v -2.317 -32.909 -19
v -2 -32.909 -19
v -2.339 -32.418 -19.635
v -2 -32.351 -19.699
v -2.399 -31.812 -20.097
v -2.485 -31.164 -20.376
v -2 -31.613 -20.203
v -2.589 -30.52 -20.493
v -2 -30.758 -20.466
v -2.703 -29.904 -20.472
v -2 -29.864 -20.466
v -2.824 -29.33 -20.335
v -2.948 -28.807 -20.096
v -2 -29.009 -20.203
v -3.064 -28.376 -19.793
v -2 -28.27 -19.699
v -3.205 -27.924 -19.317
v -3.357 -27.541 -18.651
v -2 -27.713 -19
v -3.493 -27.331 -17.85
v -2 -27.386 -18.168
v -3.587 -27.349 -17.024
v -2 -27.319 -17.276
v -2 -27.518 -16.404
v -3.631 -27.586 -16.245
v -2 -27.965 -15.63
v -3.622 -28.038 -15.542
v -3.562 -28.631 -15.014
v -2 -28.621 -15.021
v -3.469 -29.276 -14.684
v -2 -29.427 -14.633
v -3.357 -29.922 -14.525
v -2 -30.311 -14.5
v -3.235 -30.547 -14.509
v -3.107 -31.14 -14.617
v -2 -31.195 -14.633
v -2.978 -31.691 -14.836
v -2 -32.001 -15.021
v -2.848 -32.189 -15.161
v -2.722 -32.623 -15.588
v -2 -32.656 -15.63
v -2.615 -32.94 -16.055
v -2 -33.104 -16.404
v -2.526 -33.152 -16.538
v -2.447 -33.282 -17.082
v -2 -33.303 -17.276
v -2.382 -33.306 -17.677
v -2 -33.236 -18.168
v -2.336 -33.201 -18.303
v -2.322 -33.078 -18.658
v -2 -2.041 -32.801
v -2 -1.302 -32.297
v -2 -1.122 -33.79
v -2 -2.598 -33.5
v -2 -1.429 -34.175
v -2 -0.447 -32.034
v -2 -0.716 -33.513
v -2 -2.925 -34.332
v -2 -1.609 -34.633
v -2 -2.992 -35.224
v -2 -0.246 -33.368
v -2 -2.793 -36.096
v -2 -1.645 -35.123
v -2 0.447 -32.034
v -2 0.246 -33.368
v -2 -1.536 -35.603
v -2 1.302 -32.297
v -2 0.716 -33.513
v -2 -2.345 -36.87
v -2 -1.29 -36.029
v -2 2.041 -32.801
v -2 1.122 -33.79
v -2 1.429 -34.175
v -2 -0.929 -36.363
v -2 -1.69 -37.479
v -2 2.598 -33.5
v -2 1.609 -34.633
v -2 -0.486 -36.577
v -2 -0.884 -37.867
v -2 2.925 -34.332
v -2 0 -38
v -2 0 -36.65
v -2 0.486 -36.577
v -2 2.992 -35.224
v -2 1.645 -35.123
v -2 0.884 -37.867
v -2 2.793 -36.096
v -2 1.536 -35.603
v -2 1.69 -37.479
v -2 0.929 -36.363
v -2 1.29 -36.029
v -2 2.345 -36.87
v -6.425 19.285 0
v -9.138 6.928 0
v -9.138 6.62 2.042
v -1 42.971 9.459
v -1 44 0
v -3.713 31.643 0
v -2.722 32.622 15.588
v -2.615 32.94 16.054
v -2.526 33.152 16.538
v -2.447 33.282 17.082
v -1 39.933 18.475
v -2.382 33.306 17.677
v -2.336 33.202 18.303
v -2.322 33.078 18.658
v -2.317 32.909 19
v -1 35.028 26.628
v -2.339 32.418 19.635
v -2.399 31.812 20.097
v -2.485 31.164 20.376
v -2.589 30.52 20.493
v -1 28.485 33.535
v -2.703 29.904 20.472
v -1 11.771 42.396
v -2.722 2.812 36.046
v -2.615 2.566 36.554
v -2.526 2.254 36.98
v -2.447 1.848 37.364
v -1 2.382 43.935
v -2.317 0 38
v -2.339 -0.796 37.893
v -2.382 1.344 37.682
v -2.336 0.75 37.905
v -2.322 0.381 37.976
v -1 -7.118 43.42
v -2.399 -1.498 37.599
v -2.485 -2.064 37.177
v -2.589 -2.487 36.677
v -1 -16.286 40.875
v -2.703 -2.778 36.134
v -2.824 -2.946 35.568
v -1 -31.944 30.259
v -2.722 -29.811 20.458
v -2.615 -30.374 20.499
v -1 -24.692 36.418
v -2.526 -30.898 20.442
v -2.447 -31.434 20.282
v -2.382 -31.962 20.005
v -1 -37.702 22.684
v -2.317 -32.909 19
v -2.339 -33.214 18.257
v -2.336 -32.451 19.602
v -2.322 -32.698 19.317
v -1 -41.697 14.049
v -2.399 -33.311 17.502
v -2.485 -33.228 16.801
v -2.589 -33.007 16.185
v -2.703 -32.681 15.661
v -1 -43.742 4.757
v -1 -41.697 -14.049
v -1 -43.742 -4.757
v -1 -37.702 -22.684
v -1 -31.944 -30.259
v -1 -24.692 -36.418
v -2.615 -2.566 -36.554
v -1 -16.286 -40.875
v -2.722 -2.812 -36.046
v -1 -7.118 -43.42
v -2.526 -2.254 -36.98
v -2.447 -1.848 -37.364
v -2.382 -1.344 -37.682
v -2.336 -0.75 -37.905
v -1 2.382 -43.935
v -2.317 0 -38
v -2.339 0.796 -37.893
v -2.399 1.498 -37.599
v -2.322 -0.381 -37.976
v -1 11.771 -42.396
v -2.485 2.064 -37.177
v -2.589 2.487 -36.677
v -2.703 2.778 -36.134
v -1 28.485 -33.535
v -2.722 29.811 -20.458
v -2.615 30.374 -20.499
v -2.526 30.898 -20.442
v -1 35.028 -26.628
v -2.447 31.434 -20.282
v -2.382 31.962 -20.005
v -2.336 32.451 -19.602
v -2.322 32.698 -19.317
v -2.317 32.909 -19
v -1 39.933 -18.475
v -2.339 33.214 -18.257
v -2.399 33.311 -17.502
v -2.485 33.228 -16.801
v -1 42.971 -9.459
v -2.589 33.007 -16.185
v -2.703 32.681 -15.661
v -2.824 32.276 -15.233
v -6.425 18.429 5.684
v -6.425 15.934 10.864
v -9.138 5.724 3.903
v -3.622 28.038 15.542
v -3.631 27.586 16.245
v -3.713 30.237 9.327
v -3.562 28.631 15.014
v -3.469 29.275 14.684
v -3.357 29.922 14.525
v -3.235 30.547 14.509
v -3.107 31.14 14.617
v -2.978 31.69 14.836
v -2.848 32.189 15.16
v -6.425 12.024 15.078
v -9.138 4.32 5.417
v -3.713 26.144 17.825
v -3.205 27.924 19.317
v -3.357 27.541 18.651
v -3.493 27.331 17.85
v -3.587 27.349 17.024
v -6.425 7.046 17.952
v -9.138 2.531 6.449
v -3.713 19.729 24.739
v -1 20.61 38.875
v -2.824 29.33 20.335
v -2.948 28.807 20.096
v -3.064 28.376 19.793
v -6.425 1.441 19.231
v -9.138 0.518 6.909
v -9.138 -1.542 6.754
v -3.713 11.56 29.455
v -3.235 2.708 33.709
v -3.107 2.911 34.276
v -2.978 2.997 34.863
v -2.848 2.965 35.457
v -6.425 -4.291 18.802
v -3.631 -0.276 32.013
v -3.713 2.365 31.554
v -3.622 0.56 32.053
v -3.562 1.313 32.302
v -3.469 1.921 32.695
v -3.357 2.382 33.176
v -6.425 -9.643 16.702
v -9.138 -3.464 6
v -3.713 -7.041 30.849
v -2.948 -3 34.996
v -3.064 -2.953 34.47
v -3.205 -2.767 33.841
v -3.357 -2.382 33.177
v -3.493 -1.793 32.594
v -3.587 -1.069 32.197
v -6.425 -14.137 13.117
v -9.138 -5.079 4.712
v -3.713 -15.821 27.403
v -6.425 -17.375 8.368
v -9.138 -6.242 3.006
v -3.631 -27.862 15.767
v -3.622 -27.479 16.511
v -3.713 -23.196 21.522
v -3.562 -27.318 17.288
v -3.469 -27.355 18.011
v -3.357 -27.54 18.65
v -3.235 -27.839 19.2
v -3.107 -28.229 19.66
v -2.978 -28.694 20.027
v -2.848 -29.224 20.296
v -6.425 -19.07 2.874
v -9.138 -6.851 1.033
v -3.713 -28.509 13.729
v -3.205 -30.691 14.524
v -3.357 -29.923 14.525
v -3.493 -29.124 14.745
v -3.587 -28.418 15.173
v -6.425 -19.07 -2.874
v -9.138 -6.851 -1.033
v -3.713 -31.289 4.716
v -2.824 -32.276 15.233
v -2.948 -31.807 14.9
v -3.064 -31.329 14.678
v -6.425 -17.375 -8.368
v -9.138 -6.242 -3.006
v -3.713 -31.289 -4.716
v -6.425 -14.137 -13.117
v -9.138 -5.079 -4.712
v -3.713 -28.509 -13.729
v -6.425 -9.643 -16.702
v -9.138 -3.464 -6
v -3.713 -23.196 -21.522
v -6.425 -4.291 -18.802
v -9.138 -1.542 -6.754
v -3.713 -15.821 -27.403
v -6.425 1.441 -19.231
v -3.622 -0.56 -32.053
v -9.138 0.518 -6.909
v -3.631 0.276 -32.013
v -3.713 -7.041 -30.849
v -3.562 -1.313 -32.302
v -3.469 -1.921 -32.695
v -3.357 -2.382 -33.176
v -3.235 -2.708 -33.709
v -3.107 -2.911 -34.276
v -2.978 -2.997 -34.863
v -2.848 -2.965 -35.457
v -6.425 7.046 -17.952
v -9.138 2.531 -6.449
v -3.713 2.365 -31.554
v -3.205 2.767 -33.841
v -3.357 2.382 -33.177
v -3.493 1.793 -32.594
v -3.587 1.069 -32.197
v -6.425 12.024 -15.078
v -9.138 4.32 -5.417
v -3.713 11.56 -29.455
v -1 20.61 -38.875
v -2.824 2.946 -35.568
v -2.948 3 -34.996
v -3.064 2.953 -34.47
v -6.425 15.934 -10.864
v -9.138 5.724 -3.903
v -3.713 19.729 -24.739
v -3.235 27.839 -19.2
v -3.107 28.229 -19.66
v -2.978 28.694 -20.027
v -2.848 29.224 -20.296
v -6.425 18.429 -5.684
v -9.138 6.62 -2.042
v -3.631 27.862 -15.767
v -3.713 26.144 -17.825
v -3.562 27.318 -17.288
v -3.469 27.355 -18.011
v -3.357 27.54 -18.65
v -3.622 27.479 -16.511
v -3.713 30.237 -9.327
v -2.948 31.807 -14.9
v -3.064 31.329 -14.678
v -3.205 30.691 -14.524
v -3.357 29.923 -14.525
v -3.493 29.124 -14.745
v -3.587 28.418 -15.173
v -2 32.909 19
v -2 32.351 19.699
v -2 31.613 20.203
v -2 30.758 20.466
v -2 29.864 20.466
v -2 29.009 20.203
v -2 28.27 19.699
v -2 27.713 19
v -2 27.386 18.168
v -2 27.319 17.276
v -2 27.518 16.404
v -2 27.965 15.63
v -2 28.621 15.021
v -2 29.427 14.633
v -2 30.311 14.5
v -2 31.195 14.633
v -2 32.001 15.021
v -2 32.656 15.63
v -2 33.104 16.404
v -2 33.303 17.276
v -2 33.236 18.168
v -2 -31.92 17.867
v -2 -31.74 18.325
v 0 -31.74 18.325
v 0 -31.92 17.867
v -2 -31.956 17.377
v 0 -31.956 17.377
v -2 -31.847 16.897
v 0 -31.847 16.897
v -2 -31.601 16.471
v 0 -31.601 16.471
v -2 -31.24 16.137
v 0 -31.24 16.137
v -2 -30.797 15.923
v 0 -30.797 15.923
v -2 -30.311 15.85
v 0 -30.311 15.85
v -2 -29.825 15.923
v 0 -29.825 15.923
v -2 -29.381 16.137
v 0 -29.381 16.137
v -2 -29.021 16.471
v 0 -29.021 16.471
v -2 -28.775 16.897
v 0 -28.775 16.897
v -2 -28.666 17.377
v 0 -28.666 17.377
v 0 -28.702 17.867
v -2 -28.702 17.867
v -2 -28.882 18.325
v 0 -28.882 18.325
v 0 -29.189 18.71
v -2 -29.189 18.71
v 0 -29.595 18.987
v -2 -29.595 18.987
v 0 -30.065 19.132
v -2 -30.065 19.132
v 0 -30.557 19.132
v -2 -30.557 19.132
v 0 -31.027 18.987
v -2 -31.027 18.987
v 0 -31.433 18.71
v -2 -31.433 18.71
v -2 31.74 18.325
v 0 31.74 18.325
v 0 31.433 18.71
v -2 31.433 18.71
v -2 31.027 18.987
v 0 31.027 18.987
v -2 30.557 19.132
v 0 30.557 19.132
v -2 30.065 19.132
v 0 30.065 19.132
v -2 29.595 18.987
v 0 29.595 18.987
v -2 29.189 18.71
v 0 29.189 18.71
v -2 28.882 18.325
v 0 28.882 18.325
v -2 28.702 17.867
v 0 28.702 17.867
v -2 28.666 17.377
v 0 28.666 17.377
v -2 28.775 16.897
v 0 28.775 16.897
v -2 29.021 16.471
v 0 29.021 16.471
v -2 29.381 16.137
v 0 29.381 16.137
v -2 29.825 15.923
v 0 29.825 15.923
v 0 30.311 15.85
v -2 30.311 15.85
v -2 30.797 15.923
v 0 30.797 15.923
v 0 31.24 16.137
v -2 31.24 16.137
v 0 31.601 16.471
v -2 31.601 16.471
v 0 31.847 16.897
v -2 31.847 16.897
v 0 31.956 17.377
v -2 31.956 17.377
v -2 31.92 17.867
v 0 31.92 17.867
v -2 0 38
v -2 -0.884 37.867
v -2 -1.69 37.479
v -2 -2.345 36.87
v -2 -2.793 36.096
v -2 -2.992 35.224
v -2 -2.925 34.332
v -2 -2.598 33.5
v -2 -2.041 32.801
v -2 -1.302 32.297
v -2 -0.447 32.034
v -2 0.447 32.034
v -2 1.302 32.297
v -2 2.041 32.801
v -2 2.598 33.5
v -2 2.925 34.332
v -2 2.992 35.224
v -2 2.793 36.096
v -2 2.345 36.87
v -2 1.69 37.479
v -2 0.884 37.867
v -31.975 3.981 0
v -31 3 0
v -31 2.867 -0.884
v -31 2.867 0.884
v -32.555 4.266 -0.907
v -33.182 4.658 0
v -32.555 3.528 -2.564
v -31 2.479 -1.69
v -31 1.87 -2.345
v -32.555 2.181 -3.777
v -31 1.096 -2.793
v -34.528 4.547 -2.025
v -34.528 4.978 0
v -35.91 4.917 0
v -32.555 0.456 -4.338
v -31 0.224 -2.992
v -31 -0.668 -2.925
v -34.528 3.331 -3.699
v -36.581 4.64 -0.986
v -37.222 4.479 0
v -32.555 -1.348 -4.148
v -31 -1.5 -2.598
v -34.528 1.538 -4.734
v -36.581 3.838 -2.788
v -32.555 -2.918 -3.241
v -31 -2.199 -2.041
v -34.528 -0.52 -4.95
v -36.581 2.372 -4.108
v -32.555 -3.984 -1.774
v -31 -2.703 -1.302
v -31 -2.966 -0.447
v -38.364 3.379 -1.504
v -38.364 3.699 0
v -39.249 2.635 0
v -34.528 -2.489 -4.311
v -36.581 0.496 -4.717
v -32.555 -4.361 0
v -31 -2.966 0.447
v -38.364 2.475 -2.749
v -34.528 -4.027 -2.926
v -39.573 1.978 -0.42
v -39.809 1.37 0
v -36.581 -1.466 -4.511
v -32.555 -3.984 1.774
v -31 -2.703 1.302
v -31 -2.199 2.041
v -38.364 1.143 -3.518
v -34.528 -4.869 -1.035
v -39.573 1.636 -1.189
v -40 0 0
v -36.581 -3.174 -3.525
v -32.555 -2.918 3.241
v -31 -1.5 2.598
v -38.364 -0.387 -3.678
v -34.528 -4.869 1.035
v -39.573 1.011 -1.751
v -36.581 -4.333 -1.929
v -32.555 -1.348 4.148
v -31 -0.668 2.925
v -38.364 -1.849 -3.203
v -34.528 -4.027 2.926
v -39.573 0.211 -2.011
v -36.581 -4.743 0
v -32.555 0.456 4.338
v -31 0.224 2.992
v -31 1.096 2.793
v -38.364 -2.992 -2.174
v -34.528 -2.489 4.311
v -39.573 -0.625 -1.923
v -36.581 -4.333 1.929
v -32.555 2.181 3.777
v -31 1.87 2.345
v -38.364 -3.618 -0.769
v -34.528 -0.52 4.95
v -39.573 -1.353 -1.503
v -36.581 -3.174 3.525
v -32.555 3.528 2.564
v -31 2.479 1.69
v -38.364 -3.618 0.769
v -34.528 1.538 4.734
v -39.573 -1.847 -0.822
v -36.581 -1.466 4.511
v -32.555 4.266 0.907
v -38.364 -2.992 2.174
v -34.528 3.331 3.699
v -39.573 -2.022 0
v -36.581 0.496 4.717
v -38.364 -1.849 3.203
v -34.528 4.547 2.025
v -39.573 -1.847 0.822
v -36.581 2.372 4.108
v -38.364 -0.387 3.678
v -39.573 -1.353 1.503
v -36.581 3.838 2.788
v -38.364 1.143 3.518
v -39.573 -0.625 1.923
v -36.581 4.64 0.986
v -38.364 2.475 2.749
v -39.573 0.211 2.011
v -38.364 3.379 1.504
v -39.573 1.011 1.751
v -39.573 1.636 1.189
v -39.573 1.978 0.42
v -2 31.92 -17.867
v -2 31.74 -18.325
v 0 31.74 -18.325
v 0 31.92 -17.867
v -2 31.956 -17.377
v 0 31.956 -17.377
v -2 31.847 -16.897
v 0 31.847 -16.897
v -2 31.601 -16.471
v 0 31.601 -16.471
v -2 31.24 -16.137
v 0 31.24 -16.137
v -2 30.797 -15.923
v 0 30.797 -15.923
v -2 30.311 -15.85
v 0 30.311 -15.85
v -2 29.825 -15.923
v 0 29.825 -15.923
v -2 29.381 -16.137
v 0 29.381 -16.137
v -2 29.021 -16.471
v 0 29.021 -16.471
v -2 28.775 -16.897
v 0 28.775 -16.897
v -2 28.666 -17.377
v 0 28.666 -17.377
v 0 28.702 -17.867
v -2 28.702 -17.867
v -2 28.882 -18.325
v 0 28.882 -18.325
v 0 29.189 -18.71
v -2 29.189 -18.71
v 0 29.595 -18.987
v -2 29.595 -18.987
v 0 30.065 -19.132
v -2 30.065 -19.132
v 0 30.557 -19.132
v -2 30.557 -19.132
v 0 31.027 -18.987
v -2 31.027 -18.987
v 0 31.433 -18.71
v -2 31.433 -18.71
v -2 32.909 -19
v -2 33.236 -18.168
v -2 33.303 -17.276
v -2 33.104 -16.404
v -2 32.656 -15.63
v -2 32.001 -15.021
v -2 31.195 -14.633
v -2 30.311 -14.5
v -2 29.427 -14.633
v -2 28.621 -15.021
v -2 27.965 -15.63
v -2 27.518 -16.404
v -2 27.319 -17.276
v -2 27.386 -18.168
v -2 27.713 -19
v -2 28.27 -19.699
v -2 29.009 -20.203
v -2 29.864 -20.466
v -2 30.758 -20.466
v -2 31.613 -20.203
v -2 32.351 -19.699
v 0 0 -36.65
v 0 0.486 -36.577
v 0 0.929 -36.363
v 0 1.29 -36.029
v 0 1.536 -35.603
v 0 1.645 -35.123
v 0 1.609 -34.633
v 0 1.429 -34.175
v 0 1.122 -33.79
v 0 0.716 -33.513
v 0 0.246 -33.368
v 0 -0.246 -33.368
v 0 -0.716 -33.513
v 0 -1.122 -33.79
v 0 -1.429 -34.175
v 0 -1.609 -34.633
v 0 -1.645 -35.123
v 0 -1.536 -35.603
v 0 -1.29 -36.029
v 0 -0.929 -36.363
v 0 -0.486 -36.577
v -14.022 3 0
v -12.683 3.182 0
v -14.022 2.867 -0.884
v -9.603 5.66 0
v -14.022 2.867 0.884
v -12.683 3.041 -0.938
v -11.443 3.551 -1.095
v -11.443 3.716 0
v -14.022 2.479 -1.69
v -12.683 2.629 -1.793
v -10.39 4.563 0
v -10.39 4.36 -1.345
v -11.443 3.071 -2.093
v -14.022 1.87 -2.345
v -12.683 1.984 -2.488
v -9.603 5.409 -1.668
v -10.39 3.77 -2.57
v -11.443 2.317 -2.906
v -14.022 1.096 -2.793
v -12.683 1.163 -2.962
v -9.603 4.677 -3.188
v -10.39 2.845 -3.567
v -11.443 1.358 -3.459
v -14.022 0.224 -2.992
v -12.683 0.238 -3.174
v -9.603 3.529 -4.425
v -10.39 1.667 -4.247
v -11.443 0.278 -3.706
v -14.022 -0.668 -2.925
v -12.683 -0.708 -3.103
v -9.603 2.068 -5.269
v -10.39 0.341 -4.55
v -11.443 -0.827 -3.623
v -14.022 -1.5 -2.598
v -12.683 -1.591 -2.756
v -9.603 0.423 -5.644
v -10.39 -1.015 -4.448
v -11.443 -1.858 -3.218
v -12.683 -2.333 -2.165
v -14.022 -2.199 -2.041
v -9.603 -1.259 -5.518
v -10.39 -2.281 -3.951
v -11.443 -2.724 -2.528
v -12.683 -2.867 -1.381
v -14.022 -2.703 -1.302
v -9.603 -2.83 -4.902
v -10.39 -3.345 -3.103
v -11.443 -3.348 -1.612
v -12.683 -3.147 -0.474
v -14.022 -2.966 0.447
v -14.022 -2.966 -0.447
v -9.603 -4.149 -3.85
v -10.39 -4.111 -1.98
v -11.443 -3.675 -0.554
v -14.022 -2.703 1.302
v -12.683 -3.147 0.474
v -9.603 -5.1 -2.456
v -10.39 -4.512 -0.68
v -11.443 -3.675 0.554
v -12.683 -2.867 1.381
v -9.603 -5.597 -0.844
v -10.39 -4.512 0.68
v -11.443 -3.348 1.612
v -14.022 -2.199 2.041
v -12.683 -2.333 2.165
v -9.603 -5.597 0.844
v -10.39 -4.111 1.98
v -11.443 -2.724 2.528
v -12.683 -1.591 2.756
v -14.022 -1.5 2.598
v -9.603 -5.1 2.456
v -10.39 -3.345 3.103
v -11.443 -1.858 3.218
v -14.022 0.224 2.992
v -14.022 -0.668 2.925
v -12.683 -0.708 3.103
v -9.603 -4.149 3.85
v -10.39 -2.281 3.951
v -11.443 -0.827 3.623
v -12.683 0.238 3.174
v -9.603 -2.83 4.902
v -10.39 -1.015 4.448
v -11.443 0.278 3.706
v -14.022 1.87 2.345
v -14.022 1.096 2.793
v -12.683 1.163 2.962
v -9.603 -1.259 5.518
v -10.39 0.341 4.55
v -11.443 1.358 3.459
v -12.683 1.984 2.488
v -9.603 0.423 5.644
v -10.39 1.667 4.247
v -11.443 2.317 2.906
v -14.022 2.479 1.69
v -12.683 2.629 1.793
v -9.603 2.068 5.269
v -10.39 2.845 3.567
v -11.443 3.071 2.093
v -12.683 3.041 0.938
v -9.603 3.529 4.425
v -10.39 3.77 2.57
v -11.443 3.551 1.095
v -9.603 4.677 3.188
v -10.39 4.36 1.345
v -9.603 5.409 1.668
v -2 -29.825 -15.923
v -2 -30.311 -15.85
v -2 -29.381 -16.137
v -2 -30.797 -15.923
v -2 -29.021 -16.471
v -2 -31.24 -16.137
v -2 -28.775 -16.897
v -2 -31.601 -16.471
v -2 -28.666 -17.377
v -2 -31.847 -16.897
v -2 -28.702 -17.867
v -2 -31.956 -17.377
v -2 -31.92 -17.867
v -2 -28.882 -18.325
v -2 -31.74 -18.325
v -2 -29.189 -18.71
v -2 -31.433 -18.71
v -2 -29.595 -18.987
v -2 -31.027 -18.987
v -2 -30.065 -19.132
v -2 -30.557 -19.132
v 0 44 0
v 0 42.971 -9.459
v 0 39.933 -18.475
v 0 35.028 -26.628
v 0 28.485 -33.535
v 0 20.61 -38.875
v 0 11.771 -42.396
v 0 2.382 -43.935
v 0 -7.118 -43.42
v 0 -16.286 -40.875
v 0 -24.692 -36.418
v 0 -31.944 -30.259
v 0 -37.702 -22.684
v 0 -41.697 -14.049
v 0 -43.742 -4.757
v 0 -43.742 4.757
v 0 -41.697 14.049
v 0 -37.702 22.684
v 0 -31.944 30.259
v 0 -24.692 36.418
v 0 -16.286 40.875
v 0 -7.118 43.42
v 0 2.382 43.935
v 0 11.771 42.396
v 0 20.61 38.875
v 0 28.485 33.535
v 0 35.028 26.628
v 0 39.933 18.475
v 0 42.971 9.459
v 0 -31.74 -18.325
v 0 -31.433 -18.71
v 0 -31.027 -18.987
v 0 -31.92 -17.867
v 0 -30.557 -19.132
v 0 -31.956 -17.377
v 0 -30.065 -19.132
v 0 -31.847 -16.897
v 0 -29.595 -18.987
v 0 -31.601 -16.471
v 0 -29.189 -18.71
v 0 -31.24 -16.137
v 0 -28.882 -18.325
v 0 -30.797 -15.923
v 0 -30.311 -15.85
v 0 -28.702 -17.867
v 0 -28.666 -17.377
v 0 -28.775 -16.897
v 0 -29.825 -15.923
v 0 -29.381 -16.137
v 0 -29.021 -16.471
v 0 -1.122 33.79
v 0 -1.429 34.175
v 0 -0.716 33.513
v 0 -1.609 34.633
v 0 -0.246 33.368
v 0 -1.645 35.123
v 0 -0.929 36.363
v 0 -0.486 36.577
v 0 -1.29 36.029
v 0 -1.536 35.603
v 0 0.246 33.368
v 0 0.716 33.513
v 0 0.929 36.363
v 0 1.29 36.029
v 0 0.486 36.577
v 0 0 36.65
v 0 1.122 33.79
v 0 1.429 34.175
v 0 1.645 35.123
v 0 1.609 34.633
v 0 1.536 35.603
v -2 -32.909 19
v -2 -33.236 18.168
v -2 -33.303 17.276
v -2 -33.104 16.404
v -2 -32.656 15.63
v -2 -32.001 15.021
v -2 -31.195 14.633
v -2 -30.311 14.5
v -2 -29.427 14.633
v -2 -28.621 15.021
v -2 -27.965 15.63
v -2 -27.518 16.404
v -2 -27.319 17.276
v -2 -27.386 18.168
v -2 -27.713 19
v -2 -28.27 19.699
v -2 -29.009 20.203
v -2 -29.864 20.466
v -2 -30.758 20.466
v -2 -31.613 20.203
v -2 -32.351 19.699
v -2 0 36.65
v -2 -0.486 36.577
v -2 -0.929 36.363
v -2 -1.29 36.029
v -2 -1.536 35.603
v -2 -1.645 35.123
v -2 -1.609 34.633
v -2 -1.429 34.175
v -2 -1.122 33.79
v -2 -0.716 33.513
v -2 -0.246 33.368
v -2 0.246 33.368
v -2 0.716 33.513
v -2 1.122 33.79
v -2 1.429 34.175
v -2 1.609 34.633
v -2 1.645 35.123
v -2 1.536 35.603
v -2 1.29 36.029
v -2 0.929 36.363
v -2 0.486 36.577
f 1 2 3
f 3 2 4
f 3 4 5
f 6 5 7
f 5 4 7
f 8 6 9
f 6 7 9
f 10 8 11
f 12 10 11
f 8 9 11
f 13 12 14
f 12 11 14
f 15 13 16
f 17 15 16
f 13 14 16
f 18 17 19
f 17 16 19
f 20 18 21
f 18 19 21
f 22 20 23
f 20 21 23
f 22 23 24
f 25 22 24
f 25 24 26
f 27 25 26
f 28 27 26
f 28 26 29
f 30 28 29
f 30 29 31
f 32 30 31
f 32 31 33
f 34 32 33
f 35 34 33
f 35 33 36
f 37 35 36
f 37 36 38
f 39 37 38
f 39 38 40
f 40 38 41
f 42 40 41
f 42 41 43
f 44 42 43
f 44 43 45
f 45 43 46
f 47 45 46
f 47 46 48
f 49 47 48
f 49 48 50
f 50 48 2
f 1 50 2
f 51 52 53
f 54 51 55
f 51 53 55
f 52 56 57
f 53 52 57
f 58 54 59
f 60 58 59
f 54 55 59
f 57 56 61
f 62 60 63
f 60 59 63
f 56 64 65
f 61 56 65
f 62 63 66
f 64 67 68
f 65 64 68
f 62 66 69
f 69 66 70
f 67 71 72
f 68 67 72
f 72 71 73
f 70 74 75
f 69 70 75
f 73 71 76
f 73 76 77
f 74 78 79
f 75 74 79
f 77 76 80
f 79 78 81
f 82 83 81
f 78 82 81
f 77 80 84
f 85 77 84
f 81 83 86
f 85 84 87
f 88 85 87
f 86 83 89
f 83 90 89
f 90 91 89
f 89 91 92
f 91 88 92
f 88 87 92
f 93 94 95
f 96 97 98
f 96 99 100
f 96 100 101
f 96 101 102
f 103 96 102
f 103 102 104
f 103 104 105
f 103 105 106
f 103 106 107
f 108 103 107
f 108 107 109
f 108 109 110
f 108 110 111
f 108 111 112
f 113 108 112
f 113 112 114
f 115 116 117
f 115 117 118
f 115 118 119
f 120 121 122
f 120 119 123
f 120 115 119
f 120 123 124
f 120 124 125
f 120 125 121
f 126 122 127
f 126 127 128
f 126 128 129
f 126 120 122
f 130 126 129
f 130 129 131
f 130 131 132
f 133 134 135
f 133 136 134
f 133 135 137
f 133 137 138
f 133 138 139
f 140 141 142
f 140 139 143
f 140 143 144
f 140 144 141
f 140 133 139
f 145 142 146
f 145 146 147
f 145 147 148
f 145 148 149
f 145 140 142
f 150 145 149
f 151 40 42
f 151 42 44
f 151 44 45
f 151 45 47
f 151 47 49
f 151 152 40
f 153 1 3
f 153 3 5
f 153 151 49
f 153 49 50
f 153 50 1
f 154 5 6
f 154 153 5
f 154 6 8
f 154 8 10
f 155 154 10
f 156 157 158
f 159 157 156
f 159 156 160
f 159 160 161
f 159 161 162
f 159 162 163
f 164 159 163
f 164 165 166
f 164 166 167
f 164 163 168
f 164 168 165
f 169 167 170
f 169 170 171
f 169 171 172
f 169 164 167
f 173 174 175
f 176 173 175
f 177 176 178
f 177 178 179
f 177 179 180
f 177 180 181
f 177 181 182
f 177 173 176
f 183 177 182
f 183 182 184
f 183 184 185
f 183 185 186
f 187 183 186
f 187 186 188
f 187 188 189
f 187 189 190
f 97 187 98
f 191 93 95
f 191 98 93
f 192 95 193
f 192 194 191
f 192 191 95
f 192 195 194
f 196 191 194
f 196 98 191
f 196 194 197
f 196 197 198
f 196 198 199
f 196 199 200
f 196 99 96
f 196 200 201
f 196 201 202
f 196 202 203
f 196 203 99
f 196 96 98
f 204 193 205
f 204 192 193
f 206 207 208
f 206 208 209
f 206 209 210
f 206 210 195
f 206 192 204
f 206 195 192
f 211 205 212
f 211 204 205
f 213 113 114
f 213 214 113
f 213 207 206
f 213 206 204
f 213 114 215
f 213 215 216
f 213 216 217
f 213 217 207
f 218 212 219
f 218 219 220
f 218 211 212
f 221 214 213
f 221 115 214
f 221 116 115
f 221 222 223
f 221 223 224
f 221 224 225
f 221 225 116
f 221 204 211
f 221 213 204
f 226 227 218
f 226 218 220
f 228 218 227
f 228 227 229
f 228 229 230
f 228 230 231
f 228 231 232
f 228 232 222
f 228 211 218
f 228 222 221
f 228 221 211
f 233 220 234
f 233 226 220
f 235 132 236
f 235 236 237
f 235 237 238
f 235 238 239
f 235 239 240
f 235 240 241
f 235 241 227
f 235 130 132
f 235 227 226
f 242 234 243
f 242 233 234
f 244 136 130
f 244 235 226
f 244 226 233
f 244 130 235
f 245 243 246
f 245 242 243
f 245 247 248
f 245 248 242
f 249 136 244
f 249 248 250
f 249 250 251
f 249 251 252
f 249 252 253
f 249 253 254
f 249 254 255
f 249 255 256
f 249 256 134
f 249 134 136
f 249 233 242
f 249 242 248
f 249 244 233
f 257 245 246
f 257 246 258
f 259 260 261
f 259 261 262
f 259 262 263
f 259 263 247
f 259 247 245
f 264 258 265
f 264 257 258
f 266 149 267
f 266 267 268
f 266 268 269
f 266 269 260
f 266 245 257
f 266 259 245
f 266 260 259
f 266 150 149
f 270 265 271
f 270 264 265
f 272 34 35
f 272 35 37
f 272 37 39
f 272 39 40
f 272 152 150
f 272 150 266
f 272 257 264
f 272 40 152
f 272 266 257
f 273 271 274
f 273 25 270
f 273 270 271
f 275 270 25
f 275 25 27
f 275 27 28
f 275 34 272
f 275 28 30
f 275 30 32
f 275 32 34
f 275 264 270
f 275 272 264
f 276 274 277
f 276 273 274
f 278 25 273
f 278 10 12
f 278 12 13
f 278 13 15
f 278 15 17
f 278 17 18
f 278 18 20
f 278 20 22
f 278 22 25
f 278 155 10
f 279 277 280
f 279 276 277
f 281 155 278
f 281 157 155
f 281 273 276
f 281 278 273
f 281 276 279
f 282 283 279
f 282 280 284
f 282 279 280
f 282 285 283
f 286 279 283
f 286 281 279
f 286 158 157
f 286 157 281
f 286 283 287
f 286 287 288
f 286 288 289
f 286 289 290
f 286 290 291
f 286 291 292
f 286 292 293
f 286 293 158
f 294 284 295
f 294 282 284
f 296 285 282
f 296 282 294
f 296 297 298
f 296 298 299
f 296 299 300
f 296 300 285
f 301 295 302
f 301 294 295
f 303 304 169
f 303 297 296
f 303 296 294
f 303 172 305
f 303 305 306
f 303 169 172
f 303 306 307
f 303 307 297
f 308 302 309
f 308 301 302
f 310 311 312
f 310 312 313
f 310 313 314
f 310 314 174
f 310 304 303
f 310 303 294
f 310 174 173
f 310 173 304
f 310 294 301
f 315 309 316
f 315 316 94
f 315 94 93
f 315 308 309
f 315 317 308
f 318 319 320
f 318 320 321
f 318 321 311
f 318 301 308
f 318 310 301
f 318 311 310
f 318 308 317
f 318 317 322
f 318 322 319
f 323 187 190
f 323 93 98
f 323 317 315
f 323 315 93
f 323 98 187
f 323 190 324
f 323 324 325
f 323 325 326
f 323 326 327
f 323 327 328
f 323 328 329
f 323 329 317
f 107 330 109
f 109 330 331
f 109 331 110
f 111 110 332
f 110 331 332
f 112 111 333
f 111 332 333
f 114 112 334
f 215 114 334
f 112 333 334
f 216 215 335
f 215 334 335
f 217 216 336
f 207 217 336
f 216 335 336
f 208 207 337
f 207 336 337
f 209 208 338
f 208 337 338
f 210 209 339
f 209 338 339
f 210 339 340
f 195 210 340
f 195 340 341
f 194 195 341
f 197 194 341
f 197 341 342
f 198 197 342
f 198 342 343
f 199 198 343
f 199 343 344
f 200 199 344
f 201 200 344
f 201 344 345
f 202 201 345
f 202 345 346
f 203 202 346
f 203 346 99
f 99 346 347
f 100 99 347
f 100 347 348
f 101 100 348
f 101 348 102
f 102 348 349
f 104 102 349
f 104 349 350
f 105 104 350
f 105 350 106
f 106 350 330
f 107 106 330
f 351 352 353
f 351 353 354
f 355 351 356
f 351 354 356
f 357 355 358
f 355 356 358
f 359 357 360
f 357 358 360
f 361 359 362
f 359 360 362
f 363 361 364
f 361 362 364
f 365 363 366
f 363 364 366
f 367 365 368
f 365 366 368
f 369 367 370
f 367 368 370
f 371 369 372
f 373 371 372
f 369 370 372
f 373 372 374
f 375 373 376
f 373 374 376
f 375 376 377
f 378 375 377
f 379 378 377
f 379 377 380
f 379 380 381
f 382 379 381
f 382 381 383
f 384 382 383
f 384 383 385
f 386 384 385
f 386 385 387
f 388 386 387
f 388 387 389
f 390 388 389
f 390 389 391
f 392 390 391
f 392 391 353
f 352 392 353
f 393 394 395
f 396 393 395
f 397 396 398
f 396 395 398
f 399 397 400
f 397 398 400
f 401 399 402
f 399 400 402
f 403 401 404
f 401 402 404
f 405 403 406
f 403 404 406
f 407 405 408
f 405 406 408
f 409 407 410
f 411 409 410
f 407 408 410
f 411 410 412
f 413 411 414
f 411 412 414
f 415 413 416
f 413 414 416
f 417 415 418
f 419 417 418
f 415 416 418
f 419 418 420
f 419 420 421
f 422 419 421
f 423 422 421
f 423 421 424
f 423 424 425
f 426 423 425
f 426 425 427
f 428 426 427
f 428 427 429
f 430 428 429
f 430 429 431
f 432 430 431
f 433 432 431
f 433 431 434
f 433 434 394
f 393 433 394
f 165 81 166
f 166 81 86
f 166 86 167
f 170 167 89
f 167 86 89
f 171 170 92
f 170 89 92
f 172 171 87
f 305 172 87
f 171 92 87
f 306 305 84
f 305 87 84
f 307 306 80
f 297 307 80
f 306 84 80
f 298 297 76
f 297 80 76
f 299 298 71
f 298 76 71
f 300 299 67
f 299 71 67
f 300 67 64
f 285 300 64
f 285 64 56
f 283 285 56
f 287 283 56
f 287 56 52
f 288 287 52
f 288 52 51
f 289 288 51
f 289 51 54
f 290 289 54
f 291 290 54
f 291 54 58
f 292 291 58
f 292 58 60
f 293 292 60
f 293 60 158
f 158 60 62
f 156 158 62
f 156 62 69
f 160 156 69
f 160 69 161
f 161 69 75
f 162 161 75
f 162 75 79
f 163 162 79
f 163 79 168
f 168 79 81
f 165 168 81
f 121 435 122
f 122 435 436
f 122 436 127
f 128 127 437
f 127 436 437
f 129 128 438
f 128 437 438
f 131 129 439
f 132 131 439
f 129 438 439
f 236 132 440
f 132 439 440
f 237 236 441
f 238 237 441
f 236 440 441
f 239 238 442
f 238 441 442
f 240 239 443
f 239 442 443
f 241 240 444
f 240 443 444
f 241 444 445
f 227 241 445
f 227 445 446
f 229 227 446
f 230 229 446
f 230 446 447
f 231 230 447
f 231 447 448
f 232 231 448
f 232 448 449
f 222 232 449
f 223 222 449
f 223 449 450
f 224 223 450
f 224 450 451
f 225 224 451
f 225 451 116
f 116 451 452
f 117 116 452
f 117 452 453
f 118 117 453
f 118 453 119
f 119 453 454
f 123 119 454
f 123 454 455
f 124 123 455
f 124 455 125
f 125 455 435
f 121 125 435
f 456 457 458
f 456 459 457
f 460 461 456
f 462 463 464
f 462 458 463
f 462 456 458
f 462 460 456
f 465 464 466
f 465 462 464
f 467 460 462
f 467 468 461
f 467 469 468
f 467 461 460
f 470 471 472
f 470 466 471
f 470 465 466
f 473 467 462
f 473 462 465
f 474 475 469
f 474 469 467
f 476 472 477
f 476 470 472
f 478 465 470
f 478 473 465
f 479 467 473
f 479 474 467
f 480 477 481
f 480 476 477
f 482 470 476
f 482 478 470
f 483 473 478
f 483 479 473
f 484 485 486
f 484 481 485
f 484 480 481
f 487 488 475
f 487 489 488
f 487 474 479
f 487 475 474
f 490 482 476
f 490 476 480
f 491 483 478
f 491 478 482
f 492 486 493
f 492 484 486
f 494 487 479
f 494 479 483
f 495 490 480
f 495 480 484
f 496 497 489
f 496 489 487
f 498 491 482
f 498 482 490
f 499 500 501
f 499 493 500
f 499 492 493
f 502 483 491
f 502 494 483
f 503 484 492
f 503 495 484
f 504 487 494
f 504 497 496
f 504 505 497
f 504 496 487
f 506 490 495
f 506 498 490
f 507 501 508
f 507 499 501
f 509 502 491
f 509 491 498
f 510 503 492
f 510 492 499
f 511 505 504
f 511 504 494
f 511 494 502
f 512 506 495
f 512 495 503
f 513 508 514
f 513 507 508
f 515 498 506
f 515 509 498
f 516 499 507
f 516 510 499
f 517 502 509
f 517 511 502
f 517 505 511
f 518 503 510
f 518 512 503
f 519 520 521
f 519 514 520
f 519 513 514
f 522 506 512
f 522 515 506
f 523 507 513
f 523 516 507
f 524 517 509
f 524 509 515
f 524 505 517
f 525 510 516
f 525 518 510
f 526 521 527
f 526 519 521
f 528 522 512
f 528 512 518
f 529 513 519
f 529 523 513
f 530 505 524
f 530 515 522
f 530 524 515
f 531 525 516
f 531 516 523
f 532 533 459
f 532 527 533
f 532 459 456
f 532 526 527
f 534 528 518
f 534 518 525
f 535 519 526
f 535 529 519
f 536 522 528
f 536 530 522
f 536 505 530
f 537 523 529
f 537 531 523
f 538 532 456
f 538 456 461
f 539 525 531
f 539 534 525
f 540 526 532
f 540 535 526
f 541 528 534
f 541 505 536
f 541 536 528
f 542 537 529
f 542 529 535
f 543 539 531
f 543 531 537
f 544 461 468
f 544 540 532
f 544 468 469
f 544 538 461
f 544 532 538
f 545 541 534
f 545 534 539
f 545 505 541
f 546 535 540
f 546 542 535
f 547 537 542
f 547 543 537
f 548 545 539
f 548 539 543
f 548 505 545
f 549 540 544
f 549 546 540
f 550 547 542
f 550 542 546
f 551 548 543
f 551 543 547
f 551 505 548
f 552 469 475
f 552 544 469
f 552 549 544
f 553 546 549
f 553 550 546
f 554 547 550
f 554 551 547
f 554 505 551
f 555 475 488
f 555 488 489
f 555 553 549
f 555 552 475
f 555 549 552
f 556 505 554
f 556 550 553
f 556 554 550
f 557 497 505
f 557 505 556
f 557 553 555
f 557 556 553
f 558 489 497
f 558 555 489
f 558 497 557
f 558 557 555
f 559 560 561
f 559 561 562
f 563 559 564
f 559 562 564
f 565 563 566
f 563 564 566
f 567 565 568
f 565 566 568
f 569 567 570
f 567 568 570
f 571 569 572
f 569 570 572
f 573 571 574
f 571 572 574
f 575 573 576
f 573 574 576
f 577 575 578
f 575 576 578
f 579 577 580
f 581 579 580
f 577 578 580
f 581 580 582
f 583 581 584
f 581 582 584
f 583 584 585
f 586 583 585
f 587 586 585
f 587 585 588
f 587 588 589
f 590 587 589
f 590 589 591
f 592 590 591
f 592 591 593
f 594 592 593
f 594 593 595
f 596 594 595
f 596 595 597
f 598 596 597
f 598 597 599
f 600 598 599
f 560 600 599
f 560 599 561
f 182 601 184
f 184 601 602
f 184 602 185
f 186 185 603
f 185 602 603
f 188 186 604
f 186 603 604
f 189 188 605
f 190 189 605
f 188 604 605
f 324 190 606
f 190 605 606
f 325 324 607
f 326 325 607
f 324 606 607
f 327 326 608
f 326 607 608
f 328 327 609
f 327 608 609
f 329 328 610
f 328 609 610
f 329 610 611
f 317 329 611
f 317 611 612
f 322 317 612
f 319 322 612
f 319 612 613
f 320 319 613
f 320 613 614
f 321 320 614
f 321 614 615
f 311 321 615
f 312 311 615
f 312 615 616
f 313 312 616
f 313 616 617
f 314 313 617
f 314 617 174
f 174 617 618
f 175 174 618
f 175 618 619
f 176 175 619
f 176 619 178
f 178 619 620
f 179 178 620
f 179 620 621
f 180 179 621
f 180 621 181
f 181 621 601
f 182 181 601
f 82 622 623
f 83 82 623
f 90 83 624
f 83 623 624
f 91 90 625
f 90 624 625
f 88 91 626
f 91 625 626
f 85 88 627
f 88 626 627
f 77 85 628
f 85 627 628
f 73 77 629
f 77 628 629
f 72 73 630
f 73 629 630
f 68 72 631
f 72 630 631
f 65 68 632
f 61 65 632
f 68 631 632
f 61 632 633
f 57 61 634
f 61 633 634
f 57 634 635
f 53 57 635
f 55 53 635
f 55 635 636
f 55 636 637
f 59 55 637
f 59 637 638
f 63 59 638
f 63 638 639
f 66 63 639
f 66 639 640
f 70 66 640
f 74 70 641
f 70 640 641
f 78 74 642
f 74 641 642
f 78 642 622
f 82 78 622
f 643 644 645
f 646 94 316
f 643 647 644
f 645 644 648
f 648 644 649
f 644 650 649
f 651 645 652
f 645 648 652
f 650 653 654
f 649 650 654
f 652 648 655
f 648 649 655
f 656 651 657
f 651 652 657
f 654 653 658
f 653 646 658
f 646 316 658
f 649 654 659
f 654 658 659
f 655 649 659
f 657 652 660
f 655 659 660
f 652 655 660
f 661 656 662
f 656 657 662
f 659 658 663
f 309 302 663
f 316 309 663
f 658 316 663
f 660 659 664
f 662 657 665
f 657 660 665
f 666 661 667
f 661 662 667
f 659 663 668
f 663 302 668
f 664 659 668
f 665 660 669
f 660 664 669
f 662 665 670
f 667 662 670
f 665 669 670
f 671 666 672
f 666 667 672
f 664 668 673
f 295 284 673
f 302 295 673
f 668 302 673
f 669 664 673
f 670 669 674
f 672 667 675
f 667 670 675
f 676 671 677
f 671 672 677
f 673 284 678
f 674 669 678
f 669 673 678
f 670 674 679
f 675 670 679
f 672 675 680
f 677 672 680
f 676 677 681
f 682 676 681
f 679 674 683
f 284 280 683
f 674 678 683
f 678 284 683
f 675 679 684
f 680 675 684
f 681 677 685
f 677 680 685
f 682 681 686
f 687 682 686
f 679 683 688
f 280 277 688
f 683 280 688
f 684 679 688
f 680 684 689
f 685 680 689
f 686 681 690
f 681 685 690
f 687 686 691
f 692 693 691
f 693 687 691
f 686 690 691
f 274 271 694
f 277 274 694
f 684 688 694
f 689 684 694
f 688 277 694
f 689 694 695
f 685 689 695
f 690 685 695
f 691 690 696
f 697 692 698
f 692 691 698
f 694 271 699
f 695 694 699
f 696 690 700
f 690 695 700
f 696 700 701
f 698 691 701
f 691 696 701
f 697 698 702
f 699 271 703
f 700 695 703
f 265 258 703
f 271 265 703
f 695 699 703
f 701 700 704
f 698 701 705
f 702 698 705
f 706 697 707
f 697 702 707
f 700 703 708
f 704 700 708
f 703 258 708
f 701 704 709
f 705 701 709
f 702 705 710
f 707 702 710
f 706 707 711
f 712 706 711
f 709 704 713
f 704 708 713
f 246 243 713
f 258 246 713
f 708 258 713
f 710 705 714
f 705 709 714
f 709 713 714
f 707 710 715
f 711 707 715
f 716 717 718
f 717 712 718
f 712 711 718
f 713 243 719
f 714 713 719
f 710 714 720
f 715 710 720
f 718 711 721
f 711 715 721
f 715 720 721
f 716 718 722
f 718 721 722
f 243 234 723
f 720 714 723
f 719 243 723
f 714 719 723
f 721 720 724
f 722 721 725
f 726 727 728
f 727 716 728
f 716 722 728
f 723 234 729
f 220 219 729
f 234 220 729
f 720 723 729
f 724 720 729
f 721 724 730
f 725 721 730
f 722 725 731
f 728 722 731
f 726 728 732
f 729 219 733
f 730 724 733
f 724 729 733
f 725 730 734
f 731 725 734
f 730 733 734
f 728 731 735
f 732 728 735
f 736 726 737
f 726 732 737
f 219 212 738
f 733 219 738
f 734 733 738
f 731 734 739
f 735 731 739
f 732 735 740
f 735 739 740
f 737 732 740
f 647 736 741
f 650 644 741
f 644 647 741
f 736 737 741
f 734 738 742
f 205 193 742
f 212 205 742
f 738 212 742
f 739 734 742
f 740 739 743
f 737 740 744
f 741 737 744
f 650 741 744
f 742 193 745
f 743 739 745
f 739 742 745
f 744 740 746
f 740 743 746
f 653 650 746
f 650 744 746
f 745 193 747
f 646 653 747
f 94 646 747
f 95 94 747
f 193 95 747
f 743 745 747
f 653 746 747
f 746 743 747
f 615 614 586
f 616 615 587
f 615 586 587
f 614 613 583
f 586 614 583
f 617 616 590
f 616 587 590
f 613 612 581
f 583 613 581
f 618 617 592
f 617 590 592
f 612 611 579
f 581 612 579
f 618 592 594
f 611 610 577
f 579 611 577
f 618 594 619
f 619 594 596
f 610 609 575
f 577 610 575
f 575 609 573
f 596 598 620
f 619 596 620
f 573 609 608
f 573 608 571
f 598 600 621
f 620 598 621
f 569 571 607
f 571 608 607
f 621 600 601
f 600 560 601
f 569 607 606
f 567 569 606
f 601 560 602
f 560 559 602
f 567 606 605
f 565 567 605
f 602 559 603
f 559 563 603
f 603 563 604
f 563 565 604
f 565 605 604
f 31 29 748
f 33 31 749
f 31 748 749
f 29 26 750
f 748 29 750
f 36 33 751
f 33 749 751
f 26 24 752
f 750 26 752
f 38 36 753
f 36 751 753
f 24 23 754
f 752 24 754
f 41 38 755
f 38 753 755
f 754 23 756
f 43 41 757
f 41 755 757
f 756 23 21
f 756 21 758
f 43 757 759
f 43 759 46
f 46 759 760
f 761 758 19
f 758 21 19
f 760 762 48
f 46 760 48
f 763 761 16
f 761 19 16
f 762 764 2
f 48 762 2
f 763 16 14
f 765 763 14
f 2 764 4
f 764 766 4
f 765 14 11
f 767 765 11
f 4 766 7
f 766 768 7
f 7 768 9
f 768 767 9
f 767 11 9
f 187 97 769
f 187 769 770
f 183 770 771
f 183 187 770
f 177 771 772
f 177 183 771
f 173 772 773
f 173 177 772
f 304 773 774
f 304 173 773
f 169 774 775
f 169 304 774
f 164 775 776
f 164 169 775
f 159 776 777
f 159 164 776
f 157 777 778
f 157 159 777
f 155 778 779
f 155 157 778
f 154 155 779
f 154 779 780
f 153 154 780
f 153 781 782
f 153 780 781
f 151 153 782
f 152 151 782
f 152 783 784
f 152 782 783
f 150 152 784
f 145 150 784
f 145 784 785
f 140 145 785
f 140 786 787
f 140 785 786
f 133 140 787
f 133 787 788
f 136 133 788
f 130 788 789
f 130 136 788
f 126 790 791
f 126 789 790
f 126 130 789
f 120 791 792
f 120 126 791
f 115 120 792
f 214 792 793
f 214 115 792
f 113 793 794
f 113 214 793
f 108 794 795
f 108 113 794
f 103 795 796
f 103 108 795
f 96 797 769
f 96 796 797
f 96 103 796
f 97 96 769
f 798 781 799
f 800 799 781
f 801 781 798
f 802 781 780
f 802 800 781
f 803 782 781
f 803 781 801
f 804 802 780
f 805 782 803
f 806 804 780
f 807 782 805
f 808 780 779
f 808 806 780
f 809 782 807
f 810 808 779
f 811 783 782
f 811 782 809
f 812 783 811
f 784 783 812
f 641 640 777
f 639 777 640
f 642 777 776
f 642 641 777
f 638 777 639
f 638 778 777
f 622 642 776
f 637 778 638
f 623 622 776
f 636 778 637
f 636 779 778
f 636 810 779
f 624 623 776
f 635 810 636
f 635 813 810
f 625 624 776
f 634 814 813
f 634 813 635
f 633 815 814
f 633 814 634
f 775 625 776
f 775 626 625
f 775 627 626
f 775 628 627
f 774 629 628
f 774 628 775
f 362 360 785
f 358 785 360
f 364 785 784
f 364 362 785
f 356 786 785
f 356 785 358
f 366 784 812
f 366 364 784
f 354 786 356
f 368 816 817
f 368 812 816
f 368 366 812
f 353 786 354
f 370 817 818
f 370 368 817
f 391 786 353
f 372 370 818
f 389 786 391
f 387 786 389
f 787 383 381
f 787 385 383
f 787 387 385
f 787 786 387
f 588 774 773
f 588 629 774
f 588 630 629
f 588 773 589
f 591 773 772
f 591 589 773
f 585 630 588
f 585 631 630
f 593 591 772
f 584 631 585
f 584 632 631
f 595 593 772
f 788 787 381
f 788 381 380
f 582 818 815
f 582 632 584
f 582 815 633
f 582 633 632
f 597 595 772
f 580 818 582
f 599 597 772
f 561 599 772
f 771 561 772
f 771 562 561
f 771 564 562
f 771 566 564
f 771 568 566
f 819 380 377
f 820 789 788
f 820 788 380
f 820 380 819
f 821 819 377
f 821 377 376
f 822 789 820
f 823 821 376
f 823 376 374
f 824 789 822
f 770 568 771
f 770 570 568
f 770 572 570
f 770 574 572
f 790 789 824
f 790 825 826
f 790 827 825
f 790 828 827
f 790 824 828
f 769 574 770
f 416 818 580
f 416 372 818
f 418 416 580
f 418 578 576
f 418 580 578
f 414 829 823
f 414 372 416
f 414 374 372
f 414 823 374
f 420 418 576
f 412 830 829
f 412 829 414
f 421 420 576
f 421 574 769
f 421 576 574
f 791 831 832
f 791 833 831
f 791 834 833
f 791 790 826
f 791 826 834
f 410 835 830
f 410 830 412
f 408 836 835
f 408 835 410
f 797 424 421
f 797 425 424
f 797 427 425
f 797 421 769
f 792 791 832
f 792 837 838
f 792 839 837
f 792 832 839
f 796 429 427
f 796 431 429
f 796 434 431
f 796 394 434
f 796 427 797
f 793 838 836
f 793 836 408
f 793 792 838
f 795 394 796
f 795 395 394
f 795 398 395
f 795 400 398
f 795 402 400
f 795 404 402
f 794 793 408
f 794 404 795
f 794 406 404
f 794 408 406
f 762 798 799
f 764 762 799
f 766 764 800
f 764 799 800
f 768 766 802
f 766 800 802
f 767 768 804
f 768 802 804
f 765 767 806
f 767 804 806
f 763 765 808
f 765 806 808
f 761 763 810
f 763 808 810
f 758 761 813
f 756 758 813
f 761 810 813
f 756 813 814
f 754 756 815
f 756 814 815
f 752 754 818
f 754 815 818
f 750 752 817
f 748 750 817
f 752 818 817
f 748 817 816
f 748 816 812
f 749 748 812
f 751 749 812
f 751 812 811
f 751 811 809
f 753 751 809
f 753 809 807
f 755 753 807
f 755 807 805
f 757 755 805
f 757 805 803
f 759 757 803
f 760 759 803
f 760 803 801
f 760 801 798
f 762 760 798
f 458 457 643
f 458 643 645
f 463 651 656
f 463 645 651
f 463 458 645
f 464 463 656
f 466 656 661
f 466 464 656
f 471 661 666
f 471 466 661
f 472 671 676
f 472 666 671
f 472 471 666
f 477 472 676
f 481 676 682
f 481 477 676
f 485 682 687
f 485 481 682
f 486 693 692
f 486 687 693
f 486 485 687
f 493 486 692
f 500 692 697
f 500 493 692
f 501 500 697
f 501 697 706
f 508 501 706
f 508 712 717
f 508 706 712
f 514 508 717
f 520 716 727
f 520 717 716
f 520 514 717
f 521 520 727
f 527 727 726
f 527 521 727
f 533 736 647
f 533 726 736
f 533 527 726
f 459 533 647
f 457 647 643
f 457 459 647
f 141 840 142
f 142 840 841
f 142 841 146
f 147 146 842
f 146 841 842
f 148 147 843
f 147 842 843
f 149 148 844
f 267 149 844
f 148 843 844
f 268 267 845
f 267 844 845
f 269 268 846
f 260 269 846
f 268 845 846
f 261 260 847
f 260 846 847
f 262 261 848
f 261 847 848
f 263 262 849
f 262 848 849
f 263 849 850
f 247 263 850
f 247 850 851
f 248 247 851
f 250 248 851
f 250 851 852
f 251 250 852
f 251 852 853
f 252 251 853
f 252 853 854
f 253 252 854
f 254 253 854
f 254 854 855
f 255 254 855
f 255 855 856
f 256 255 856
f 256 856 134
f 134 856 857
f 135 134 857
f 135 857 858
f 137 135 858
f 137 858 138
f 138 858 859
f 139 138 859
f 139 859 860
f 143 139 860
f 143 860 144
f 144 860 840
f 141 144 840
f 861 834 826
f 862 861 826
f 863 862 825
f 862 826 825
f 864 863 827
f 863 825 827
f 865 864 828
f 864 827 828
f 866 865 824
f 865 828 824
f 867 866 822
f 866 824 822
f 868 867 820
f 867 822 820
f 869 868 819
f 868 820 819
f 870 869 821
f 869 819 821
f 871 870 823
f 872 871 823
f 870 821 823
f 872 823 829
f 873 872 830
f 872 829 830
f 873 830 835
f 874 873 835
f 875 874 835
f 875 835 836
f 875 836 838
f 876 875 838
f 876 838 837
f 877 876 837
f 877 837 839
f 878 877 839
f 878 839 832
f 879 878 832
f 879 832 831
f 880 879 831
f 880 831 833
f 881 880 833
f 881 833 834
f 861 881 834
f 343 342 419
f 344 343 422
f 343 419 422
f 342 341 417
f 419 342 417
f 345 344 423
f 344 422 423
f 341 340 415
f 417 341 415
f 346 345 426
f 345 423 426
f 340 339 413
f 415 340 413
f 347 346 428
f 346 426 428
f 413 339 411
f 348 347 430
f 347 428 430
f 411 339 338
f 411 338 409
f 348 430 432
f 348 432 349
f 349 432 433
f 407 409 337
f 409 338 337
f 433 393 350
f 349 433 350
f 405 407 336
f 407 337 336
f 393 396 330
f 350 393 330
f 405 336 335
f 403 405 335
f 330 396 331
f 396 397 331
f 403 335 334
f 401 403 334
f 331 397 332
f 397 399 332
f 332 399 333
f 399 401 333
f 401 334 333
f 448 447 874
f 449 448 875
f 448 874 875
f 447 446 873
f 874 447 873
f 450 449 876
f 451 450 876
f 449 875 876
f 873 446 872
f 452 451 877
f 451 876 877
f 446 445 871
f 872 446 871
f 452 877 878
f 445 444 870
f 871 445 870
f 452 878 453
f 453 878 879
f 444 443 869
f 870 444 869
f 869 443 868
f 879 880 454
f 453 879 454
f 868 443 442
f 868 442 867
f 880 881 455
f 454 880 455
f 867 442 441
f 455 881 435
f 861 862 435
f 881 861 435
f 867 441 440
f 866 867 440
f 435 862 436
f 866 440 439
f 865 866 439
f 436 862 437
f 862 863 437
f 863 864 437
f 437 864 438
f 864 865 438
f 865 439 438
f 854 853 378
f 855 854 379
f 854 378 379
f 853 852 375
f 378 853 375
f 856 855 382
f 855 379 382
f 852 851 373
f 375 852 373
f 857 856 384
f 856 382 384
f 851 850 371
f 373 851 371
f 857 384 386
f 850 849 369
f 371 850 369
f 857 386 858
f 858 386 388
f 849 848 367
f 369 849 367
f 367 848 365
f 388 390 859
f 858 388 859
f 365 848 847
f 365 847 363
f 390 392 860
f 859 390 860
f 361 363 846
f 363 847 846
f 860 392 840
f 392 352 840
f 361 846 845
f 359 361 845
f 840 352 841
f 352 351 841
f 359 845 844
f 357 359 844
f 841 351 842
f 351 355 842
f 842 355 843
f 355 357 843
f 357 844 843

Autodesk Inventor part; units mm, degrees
ref_plane "YZ Plane" through (0, 0, 0) normal (1, 0, 0) x (0, 1, 0)
ref_plane "XZ Plane" through (0, 0, 0) normal (0, 1, 0) x (-1, 0, 0)
sketch "Sketch1" plane through (0, 0, 0) normal (0, 0, 1) x (1, 0, 0)
  line L0 (0, 0) -> (0, 44)
  line L1 (-14.0215, 3) -> (-31, 3)
  arc A0 (-31, 3) -> (-40, 0) centre (-35, 0) ccw
  line L2 (-40, 0) -> (0, 0)
  line L3 (0, 44) -> (-1, 44)
  line L4 (-1, 44) -> (-9.1378, 6.928)
  arc A1 (-14.0215, 3) -> (-9.1378, 6.928) centre (-14.0215, 8) ccw
  point P0 (-10, 3)
  dimension "d0" = 44
  dimension "d1" = 5
  dimension "d2" = 3
  dimension "d3" = 1
  dimension "d4" = 35
  dimension "d5" = 10
  dimension "d18" = 5
revolve "Revolution1" add sketch "Sketch1" angle 360 about axis through (-40, 0, 0) along (1, 0, 0)
sketch "Sketch2" plane through (0, 0, 0) normal (1, 0, 0) x (0, 0, -1)
  line L0 (0, 0) -> (35, 0) construction
  circle A0 centre (35, 0) radius 1.65
  dimension "d7" = 3.3
  dimension "d8" = 35
extrude "Extrusion1" cut sketch "Sketch2" against normal through all
ref_plane "Work Plane1" through (-2, 0, 0) normal (1, 0, 0) x (0, 0, -1)
sketch "Sketch3" plane through (-2, 0, 0) normal (1, 0, 0) x (0, 0, -1)
  circle A0 centre (35, 0) radius 3
  circle A1 centre (35, 0) radius 1.65 projected
  point P0 (0, 0)
  dimension "d12" = 6
extrude "Extrusion2" cut sketch "Sketch3" against normal through all contours A0 | A1
pattern_circular "Circular Pattern1" count 6 over 360 about axis through (-22.5107, 0, 0) along (1, 0, 0) of "Extrusion2", "Extrusion1"
properties part number "TrainingTarget"
